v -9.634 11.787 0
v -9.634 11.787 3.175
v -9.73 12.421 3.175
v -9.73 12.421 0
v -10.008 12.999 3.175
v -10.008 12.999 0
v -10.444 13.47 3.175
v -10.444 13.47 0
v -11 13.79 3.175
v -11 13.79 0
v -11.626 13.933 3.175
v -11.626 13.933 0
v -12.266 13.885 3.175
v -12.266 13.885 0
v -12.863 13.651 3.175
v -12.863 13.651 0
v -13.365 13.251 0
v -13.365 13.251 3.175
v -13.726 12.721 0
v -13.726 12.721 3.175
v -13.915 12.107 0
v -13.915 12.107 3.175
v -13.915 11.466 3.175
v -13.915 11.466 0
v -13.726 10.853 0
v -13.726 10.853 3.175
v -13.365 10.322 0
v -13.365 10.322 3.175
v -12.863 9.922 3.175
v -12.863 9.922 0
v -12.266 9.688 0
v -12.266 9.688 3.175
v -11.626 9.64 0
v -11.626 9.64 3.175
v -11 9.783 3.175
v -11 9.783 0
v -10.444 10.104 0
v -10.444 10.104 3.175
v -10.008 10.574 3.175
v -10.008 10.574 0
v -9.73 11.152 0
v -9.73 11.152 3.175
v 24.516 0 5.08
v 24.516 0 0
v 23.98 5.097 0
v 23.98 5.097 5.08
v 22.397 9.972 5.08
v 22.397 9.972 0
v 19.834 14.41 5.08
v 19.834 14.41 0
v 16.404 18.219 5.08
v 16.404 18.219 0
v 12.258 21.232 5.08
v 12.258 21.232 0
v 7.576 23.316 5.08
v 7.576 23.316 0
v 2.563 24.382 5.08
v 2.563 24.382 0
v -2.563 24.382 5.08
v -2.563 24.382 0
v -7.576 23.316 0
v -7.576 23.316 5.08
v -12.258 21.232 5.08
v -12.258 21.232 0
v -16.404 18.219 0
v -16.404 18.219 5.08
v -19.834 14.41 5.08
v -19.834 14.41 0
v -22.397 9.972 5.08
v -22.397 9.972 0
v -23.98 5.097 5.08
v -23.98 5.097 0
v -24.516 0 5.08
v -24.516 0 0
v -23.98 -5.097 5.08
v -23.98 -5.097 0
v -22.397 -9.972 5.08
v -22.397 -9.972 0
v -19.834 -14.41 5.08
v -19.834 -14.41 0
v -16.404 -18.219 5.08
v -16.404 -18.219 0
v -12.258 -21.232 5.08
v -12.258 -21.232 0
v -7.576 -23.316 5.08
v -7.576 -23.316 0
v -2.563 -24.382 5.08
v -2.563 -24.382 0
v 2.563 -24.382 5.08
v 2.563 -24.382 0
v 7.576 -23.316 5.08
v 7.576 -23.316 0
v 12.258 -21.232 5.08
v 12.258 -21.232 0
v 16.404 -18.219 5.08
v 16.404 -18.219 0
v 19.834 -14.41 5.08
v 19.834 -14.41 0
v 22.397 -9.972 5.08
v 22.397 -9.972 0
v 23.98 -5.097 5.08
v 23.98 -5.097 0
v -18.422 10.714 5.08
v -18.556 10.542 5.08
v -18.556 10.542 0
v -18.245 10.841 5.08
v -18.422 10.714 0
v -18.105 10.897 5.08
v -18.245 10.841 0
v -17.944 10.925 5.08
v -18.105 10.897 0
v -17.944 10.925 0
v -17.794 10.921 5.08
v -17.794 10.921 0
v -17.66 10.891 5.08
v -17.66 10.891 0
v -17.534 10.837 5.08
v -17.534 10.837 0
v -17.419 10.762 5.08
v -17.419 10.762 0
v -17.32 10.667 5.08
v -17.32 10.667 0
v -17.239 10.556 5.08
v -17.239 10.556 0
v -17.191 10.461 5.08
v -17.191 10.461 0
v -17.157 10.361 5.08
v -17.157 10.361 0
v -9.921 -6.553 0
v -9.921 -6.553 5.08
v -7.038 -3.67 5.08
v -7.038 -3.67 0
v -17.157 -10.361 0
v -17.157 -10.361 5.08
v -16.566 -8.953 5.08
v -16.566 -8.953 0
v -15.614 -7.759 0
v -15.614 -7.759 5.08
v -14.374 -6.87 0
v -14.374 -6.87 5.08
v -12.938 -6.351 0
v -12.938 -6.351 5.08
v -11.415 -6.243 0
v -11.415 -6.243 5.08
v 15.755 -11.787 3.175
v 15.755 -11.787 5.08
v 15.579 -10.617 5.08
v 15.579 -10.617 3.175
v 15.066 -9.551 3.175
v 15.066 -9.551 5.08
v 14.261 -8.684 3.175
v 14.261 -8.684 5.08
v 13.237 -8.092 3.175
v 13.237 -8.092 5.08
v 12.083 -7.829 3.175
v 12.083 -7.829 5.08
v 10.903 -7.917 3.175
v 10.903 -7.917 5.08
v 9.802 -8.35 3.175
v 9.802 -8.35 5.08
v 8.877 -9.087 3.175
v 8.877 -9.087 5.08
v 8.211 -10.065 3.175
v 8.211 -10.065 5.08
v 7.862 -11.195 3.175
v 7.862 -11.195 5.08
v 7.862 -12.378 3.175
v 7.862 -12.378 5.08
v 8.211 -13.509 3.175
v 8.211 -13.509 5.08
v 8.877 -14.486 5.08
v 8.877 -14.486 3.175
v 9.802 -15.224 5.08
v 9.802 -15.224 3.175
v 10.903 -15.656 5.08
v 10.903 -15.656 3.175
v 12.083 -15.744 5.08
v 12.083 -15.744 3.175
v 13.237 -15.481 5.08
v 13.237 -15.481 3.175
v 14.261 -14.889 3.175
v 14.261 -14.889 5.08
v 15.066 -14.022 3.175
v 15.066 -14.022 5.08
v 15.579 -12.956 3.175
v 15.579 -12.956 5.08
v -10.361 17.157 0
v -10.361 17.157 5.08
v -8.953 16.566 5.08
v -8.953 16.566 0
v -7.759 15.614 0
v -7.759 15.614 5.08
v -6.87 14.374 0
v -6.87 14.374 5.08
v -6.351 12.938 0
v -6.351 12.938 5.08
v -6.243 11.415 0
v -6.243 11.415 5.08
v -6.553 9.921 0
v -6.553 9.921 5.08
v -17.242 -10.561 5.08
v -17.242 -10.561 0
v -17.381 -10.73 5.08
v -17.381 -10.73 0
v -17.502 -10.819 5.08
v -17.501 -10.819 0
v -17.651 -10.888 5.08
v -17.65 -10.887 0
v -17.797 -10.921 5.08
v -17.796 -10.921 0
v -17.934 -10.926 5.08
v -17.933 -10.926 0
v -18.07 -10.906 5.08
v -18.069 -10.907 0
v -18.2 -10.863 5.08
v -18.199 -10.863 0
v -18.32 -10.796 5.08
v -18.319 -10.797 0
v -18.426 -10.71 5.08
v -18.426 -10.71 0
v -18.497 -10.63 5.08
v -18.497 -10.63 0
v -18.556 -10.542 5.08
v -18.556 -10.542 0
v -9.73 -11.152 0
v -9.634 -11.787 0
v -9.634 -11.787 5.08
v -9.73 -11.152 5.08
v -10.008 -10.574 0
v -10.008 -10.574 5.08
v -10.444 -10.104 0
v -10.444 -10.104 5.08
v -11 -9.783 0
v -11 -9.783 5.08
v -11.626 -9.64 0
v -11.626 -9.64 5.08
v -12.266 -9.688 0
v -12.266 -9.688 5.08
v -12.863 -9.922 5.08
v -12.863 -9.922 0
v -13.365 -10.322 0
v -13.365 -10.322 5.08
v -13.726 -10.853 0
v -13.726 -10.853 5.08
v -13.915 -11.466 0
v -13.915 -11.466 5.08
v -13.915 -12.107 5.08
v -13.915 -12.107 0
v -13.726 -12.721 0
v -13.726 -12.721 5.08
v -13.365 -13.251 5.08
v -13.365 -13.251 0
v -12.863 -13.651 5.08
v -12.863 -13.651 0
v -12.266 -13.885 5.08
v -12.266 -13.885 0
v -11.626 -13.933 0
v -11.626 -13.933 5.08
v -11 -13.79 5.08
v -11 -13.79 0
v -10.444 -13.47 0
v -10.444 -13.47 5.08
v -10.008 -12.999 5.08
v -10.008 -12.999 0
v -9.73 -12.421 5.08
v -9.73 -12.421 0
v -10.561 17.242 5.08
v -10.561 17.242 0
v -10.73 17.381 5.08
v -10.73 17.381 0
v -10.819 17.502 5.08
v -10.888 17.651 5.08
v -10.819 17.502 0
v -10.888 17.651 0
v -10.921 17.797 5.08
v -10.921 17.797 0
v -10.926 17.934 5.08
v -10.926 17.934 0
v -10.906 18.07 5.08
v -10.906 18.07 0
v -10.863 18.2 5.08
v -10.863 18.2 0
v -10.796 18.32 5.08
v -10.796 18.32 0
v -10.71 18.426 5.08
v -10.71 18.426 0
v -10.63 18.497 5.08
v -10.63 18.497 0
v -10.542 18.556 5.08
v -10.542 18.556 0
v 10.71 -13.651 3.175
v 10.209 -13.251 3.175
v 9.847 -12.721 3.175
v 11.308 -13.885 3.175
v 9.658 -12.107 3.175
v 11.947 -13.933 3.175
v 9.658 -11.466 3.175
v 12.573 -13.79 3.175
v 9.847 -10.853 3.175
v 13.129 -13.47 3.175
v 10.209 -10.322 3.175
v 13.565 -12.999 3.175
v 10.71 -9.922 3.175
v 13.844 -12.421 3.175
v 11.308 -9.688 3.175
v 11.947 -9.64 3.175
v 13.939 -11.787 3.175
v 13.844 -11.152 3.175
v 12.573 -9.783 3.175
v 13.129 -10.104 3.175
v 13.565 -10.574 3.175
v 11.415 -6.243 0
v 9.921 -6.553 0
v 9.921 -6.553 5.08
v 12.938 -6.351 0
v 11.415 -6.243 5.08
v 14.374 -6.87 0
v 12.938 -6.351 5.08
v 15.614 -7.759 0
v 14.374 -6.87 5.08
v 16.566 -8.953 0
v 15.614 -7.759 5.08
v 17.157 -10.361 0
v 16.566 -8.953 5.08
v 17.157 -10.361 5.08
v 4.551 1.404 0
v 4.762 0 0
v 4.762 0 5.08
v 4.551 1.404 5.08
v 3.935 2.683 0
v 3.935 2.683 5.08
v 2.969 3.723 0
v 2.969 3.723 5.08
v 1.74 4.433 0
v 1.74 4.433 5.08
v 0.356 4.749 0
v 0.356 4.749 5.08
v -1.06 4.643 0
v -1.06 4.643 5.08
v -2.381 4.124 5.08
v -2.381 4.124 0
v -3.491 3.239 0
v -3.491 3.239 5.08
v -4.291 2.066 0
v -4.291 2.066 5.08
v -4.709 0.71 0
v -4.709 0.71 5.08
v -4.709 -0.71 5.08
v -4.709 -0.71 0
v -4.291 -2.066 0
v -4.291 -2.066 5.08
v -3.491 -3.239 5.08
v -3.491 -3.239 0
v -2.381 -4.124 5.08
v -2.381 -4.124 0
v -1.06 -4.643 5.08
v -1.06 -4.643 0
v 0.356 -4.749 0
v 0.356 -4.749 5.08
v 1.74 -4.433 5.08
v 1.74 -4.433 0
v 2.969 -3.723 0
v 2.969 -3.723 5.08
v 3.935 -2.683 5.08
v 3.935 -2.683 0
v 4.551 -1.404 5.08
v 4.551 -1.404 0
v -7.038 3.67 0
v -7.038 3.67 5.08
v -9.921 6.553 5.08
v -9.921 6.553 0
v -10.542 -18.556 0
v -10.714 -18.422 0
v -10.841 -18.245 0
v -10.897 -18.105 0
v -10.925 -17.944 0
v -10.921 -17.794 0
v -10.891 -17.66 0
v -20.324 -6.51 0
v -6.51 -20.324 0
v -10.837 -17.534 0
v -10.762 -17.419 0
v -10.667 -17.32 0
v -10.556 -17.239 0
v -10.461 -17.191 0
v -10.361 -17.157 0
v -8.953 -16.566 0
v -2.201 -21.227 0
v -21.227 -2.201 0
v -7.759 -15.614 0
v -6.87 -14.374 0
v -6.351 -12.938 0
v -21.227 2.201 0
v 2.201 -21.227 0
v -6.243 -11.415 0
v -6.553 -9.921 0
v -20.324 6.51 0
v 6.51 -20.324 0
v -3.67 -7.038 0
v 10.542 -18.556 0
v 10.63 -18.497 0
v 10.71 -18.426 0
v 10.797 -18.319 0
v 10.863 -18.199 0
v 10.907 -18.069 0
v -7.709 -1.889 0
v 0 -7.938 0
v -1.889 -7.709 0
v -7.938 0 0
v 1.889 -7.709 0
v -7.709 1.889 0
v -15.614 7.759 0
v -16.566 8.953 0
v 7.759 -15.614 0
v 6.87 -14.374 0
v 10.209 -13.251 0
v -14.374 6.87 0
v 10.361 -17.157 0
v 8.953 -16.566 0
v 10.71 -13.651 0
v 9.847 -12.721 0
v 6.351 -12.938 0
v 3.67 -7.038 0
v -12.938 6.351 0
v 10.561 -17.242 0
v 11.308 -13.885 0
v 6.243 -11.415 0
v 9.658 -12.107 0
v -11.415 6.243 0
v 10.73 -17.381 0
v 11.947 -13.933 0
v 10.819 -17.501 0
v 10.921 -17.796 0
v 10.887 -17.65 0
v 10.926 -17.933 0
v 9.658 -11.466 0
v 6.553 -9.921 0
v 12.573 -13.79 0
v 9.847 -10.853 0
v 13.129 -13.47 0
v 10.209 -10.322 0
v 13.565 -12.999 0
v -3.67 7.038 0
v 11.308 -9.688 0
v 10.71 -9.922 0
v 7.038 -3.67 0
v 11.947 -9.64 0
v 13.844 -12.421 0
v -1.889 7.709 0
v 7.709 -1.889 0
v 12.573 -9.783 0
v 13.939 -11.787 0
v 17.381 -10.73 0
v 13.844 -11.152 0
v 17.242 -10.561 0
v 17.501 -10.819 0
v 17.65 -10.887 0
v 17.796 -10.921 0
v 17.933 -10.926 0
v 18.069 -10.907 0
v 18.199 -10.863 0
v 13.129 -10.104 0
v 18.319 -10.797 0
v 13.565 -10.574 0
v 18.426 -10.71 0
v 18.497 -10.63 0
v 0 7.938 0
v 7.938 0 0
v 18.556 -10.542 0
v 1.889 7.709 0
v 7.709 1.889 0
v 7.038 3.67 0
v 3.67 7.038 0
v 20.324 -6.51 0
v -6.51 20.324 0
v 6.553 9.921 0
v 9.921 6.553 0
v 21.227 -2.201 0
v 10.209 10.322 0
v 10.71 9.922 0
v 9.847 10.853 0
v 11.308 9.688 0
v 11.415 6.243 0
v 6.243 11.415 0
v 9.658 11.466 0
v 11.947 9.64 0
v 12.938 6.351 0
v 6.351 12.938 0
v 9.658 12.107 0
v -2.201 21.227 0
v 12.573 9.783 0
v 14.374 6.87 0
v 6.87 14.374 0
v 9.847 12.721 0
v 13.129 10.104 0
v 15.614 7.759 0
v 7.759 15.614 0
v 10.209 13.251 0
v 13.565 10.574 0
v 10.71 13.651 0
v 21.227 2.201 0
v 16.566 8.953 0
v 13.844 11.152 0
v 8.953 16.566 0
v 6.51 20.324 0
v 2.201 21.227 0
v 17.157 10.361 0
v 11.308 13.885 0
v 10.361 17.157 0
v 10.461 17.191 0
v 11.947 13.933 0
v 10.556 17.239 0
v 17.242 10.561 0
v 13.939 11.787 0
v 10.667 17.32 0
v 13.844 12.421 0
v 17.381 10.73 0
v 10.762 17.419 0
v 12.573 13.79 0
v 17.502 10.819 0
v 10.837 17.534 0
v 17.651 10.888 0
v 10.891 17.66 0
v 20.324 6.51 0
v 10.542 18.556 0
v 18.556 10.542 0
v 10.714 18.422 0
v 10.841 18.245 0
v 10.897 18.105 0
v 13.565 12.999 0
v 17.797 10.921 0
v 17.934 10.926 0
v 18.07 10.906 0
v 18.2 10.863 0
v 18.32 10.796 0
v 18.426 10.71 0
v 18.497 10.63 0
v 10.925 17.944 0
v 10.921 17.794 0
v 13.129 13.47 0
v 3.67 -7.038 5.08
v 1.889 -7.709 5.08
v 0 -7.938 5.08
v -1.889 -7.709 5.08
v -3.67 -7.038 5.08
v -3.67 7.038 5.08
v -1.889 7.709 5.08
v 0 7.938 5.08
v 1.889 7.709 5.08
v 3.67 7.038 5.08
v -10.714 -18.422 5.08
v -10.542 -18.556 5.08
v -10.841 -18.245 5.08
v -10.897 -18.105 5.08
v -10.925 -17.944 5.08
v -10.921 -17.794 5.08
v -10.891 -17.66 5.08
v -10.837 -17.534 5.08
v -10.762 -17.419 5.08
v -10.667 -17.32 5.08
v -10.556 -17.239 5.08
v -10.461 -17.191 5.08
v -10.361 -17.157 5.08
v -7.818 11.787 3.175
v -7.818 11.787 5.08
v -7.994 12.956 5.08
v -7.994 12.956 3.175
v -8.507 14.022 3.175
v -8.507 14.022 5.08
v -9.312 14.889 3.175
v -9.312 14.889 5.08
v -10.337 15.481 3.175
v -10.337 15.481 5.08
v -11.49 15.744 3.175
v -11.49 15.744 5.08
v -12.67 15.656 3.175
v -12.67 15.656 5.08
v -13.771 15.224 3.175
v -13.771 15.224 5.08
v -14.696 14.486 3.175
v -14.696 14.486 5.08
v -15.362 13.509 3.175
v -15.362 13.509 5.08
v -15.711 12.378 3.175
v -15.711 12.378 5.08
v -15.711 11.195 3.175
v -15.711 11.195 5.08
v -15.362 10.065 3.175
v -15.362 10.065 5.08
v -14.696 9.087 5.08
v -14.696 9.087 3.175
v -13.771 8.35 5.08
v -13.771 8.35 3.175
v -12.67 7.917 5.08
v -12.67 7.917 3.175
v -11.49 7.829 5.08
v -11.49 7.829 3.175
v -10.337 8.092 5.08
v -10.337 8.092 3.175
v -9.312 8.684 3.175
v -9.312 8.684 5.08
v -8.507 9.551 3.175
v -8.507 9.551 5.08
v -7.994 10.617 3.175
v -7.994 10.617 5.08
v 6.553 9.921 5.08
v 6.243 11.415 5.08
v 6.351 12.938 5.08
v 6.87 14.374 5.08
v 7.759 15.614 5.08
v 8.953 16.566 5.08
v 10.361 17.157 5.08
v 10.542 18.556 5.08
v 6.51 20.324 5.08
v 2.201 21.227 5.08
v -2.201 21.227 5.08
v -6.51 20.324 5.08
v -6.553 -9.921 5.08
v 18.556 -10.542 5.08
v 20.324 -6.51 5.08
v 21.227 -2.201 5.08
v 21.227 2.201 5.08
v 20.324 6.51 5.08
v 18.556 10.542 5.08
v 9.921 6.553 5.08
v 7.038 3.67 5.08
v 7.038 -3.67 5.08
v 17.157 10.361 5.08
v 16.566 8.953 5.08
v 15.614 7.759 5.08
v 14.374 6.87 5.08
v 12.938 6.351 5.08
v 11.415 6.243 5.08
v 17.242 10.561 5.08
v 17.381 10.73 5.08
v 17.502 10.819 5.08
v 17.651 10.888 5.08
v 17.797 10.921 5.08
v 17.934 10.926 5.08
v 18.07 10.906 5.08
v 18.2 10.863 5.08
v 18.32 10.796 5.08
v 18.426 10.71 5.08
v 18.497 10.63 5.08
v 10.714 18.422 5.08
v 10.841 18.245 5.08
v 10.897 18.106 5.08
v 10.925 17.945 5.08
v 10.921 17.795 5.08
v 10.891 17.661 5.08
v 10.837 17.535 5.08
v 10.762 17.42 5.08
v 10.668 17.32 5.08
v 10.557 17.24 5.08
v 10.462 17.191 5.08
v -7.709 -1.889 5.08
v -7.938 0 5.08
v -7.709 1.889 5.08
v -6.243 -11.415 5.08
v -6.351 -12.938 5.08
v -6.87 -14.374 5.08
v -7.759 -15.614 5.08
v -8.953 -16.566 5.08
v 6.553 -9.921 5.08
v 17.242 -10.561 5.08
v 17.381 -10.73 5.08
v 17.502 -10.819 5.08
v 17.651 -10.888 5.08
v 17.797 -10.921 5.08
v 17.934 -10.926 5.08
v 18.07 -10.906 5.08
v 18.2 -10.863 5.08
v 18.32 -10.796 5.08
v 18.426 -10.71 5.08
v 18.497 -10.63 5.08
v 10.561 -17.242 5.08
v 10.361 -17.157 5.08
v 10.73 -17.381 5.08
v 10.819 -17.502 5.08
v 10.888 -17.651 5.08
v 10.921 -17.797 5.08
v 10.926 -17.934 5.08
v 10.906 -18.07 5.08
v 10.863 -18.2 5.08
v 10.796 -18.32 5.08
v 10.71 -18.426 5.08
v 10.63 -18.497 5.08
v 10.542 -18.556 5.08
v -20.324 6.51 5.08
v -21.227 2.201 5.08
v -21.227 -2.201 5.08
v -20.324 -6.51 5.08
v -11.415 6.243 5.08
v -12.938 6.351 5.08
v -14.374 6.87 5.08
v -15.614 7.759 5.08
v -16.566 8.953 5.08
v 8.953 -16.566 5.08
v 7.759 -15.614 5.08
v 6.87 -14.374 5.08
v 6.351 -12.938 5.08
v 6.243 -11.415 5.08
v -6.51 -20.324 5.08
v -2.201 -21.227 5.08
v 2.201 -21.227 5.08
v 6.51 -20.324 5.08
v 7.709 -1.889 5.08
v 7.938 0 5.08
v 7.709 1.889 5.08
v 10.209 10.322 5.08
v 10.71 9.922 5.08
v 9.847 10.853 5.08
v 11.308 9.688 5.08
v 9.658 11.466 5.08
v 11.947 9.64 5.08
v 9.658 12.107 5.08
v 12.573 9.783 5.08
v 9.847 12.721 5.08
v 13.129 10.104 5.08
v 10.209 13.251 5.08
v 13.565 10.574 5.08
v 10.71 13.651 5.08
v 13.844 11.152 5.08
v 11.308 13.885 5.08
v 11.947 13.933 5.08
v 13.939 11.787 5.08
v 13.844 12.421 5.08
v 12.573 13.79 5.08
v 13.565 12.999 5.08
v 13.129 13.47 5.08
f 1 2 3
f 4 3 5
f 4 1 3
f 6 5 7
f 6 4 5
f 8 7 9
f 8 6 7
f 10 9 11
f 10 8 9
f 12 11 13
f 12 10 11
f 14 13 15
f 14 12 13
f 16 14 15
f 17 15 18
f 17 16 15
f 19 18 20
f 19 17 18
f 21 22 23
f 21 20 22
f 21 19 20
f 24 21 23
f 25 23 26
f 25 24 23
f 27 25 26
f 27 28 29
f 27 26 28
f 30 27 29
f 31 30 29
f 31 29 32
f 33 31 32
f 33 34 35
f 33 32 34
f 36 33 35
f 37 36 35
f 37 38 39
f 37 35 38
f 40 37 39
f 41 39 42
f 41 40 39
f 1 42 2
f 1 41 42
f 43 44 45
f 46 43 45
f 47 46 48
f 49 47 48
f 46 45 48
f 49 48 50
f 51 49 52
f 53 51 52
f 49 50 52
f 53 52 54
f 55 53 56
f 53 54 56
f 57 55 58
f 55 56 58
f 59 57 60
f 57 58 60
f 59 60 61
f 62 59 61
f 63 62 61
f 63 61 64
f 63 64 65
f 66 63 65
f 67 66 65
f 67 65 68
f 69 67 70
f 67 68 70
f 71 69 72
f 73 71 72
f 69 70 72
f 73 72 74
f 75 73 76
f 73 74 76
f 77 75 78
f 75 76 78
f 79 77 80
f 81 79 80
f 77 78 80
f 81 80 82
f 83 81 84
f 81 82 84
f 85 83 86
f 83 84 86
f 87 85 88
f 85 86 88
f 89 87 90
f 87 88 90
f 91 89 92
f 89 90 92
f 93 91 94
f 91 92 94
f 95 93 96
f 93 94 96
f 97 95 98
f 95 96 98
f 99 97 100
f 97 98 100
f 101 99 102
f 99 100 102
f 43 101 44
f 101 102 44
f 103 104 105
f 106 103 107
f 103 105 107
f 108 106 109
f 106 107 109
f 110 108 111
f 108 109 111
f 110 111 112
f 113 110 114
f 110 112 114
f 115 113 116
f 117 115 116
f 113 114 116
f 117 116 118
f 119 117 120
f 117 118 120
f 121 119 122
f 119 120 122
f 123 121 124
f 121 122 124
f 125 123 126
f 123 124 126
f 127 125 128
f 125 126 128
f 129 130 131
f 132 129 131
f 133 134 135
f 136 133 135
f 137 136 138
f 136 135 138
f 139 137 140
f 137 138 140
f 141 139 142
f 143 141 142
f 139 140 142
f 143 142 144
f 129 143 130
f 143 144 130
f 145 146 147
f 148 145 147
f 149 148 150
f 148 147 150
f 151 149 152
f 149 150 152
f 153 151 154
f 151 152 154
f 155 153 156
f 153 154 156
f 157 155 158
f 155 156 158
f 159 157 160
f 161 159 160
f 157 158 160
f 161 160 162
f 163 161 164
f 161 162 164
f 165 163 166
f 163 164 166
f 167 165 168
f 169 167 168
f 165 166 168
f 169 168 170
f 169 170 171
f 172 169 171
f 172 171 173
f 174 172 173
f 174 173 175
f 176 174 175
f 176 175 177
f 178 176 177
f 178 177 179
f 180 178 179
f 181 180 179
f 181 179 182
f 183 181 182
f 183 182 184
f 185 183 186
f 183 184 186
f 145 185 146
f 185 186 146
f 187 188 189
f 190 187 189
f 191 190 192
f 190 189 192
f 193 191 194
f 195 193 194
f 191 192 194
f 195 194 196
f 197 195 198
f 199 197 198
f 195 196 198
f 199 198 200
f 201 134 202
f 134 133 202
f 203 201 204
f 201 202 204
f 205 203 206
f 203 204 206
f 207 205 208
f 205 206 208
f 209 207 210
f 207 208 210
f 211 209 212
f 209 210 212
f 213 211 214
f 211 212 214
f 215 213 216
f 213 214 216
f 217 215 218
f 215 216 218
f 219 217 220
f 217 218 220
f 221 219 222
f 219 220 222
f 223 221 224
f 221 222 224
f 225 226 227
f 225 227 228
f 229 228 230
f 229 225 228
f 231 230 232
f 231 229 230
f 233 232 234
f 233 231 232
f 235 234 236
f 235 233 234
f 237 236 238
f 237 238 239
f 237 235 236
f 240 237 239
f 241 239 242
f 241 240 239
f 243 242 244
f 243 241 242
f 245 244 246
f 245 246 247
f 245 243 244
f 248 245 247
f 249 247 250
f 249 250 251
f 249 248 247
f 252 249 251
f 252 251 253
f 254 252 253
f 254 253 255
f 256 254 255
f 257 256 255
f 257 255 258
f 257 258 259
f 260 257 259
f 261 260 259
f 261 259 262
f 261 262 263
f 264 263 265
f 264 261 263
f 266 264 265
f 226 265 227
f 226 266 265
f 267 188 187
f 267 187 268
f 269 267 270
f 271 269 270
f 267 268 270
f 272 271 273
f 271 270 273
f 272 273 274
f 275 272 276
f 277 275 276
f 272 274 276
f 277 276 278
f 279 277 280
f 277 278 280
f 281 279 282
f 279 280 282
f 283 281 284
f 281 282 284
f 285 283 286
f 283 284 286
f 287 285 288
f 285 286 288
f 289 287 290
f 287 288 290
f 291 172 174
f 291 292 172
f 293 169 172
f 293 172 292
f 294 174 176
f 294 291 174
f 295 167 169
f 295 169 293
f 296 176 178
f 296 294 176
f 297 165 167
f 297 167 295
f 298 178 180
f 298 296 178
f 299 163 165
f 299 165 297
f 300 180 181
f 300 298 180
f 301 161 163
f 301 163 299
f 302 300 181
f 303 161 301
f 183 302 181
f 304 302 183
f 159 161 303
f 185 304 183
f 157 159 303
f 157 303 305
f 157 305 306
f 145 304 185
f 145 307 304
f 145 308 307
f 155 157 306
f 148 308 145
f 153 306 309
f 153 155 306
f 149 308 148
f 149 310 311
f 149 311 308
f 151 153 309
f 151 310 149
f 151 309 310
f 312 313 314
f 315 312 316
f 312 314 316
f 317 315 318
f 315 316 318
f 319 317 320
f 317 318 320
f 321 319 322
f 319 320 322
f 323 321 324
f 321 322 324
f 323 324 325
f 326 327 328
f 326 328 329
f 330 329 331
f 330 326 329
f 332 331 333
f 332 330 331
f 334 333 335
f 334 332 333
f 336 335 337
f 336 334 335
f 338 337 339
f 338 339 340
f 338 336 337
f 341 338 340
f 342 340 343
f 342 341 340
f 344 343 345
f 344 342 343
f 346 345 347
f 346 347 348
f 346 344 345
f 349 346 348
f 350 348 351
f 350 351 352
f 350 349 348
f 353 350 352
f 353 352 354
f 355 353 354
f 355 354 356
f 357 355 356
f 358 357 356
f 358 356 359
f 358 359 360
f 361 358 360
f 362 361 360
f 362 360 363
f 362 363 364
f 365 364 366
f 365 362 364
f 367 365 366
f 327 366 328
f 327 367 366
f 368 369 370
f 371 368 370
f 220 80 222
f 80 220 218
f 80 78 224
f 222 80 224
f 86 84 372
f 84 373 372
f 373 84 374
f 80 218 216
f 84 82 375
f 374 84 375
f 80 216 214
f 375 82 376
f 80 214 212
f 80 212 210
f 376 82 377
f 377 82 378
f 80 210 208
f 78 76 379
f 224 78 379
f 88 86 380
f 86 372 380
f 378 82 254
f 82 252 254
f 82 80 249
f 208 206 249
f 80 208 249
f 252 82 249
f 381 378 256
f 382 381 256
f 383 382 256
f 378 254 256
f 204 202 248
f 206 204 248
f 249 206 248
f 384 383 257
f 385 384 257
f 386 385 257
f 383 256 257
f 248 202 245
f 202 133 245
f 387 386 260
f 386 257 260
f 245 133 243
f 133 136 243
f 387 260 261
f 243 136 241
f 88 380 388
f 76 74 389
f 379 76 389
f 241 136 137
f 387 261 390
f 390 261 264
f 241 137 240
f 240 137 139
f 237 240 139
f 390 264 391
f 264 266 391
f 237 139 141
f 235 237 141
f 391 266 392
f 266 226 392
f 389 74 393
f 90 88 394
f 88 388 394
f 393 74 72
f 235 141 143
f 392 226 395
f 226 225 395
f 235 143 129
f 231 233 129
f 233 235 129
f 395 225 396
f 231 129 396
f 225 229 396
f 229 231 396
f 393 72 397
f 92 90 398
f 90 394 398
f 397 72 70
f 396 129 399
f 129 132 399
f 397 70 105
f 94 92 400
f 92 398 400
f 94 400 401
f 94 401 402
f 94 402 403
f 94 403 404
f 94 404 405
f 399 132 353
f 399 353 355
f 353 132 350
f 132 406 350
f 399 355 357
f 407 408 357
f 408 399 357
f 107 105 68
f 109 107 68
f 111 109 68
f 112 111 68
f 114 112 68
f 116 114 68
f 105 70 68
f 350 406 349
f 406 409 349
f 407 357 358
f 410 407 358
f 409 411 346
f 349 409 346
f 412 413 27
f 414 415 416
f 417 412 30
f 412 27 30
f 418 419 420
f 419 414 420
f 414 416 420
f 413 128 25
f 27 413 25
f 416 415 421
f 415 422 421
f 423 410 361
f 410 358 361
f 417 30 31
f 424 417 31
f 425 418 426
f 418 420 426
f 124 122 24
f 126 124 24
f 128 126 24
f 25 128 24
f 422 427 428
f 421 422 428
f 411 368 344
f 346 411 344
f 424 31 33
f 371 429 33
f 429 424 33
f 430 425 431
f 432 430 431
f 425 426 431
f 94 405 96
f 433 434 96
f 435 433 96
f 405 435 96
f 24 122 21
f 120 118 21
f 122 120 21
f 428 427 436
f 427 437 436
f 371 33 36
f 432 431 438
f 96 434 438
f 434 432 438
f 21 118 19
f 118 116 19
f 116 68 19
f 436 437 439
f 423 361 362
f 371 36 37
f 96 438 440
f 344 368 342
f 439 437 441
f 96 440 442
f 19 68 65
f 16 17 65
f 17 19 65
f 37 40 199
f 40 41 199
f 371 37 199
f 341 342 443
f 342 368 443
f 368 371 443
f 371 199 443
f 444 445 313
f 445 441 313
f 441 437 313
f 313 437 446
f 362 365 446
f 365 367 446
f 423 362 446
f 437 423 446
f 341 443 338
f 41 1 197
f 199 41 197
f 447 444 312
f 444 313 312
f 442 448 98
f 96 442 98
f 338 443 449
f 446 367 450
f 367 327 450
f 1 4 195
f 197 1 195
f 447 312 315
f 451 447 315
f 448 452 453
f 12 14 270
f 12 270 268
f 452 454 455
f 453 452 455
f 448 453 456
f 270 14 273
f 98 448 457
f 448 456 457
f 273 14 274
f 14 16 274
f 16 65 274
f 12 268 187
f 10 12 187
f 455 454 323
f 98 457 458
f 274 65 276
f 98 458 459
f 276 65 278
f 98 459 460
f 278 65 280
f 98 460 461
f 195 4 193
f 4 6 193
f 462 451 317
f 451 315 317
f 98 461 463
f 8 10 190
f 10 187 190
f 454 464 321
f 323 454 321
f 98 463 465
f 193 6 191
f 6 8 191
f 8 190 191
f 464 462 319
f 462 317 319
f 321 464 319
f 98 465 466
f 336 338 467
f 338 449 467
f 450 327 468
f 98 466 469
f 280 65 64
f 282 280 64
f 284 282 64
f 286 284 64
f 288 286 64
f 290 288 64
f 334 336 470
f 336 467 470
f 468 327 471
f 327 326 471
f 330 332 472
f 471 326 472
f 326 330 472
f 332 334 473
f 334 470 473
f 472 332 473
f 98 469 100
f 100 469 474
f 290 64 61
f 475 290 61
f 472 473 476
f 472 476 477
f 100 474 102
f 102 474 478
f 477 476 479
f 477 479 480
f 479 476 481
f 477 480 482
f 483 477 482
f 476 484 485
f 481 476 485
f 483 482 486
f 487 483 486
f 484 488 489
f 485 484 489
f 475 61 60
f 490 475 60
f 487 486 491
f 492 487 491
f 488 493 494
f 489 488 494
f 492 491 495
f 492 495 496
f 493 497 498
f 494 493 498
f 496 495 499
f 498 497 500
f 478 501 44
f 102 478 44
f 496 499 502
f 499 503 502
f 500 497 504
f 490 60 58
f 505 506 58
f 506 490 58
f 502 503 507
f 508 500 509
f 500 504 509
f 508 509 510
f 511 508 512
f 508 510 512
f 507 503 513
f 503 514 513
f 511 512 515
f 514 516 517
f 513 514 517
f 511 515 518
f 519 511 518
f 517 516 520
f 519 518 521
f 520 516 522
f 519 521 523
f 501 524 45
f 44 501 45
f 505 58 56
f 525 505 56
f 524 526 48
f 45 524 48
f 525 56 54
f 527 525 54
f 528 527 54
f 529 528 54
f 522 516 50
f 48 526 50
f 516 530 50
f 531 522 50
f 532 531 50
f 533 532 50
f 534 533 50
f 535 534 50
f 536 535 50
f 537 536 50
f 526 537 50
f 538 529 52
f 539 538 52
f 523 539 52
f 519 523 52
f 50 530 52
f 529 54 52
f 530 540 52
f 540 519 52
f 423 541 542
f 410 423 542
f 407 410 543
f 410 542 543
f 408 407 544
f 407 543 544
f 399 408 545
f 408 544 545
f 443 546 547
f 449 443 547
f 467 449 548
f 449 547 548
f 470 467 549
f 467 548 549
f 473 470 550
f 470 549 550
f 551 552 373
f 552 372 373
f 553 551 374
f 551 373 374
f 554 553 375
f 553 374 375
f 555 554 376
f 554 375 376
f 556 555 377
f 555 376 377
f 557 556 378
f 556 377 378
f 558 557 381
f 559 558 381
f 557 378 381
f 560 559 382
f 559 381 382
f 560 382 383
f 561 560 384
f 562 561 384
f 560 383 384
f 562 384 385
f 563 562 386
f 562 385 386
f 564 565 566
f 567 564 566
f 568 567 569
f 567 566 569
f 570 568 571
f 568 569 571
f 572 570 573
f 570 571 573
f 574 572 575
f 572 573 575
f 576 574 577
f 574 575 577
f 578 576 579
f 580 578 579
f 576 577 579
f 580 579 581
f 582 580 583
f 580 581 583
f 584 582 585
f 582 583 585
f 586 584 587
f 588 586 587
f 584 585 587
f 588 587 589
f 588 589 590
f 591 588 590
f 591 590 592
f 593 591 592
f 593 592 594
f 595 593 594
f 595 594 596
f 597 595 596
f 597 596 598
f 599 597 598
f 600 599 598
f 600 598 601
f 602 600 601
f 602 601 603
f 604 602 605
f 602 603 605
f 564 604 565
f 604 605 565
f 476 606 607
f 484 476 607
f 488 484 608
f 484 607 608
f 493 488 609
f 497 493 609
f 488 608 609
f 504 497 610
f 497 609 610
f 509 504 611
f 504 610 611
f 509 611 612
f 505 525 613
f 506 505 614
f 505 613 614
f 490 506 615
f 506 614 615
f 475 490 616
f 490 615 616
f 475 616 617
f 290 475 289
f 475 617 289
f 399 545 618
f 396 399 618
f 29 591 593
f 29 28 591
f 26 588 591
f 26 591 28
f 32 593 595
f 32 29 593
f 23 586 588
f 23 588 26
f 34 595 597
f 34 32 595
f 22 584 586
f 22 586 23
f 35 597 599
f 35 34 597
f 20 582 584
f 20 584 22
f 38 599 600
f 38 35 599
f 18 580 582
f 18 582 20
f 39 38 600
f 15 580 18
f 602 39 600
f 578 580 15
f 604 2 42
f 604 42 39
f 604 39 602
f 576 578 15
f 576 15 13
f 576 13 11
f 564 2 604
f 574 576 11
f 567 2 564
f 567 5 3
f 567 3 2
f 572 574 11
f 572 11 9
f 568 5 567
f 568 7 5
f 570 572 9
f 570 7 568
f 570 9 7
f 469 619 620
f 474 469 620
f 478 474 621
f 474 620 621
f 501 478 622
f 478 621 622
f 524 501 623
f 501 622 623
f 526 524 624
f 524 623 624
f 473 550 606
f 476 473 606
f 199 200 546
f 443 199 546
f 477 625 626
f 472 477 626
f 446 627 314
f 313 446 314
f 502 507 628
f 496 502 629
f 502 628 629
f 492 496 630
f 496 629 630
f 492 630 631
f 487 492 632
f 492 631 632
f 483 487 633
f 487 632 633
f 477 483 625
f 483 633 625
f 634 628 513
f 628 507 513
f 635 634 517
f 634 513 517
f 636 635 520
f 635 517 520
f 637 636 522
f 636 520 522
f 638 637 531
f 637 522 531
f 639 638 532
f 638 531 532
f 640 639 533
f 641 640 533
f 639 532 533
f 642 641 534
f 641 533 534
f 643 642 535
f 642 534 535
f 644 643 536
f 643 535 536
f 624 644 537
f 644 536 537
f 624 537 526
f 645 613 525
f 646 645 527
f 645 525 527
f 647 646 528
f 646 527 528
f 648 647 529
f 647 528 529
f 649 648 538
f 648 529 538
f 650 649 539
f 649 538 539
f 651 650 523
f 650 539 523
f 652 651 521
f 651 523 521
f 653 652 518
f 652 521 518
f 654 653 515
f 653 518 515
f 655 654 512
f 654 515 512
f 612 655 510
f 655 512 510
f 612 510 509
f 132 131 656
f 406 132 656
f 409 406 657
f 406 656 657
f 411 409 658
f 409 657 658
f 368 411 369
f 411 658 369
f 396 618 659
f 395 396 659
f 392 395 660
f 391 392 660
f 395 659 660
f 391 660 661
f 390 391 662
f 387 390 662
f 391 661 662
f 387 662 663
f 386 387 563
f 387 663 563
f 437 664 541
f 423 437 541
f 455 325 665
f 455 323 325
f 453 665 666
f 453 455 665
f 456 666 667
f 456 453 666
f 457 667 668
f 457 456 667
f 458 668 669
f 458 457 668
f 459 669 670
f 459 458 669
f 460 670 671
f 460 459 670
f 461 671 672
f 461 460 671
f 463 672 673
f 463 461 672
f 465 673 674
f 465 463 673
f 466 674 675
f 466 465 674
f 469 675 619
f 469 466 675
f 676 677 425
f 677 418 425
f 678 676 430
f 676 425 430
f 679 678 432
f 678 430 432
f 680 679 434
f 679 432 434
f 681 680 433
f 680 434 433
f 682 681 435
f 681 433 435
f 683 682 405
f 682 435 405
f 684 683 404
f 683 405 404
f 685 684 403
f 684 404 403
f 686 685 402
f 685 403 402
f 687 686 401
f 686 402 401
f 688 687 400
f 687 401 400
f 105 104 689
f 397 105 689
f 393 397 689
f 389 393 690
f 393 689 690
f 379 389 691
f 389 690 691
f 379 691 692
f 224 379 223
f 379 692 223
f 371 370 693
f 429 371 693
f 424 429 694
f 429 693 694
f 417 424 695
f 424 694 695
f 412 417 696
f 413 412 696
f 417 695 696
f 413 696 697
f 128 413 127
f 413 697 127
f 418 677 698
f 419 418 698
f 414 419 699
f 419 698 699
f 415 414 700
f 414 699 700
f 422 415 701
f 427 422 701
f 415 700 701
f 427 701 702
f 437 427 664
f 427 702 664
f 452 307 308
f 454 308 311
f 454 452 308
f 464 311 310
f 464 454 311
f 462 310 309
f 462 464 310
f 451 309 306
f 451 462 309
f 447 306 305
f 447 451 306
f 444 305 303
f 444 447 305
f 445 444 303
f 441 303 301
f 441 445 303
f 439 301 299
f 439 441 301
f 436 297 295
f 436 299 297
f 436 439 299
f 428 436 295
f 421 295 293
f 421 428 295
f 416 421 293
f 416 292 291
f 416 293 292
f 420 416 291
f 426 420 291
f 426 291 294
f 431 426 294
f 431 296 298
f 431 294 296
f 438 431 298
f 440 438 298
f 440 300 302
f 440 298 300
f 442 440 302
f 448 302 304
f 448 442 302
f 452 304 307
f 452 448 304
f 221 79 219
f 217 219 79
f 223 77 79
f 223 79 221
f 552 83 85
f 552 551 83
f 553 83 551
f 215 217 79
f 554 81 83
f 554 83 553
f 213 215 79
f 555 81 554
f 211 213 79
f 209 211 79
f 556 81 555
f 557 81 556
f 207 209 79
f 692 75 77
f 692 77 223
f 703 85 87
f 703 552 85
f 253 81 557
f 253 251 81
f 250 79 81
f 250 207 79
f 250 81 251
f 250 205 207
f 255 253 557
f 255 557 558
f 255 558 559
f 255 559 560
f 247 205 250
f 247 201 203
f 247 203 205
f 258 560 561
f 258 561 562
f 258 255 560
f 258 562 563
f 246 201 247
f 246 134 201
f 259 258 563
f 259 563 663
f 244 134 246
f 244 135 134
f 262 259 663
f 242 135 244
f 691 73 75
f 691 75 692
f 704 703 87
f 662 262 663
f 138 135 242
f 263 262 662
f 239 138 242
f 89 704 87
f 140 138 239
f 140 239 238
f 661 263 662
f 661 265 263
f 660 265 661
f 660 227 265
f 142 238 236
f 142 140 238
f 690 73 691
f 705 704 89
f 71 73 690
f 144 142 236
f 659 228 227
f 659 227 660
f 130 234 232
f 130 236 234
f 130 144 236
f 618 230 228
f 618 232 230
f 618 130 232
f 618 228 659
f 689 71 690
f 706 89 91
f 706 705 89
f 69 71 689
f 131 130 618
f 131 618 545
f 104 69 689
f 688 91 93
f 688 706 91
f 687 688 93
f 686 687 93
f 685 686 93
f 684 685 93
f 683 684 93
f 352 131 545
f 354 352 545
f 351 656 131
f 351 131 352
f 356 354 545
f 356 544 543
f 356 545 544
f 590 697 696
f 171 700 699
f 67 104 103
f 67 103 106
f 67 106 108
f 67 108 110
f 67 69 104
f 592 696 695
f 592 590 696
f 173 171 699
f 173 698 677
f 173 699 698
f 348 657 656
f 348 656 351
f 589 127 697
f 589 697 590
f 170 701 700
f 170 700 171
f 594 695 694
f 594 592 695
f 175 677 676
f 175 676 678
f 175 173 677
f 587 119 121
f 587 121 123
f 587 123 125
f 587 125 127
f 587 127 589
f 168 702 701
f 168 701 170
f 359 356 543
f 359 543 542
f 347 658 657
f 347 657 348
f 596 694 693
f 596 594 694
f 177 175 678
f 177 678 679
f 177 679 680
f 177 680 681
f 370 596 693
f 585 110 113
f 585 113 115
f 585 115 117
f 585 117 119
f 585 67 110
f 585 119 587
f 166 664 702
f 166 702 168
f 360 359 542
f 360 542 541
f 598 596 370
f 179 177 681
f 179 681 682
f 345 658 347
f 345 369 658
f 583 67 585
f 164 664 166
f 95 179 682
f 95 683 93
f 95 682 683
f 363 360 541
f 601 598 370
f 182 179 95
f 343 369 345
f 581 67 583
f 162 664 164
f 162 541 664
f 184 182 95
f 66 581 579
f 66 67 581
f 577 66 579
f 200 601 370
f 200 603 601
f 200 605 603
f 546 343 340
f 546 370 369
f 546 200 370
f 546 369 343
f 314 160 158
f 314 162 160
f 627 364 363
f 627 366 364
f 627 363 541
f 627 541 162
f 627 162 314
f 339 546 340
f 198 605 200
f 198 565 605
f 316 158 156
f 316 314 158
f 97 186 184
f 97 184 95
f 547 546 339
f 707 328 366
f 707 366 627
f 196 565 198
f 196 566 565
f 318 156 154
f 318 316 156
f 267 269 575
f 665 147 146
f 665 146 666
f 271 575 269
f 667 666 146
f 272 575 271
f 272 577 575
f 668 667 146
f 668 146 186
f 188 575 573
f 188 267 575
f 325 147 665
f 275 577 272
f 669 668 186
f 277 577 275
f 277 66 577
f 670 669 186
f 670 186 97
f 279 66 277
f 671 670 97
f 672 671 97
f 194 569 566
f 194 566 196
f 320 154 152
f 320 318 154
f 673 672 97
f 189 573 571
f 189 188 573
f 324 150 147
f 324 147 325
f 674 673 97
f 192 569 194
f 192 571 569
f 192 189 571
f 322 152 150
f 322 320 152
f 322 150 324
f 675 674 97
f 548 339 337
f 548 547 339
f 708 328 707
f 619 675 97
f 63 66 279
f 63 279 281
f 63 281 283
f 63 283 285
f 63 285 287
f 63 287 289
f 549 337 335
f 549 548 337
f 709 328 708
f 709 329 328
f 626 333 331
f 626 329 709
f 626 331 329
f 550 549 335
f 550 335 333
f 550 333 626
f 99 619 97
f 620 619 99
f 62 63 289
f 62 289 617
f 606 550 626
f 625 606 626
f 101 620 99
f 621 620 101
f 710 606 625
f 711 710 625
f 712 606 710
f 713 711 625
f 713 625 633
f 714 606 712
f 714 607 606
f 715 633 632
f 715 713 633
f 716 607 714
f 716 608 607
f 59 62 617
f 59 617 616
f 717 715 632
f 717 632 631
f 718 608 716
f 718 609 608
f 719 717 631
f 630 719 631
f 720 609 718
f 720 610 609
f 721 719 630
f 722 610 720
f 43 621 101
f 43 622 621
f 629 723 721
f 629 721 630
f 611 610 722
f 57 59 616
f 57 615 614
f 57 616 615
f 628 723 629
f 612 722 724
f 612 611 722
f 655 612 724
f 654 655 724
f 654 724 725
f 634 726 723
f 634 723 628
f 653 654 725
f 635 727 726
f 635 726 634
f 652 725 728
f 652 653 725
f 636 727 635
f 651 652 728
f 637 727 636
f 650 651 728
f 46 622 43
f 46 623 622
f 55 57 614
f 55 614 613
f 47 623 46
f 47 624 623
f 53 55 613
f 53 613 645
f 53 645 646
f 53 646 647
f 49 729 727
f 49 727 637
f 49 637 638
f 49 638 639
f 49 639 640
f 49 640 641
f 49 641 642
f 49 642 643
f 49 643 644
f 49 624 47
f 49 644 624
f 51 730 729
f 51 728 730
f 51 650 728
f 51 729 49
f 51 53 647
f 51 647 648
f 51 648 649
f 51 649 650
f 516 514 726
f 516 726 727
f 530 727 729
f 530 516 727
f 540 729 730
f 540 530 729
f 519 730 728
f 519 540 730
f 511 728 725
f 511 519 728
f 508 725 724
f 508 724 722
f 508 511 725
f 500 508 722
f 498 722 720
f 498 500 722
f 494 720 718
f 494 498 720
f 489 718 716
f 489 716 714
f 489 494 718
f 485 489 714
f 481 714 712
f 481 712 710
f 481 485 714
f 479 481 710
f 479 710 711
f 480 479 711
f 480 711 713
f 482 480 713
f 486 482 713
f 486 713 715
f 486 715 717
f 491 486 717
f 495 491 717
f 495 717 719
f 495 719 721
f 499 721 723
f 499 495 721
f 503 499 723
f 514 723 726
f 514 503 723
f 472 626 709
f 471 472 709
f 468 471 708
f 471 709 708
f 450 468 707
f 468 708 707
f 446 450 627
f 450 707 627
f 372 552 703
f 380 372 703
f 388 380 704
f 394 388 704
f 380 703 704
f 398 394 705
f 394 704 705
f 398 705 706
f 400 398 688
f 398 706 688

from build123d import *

# Parameters (mm, degrees)
F0_R            = 24.51608
F0_R_2          = 2.15265
F0_R_3          = 4.7625
F1_DEPTH        = 5.08
F3_DEPTH        = 5.08
F3_COPIES_COUNT = 4
F4_R            = 0.762
F6_R            = 3.96875
F7_DEPTH        = 1.905


# Not quite as in the source:
# - a pattern or mirror of a feature is missing from the dataset's text; its kind, count and spacing are read off the source's solid


with BuildPart() as f1:
    # F0 (on Top) → F1 (new body)
    with BuildSketch(Plane.XY):
        Circle(F0_R)
        with Locations((-11.7865906, -11.7865906)):
            Circle(F0_R_2, mode=Mode.SUBTRACT)
        with Locations((11.7865906, -11.7865906)):
            Circle(F0_R_2, mode=Mode.SUBTRACT)
        with Locations((-11.7865906, 11.7865906)):
            Circle(F0_R_2, mode=Mode.SUBTRACT)
        Circle(F0_R_3, mode=Mode.SUBTRACT)
        with Locations((11.7865906, 11.7865906)):
            Circle(F0_R_2, mode=Mode.SUBTRACT)
    extrude(amount=F1_DEPTH)

    # F2 (on face) → F3 (cut, through all)
    with BuildSketch(Plane.XY.offset(5.08)):
        with BuildLine():
            ThreePointArc((-12.5005198818, 17.2967828873), (-7.4612395718, 15.2741760893), (-6.553034663, 9.9206307084))
            Line((-6.553034663, 9.9206307084), (-3.6703384477, 7.0379344931))
            ThreePointArc((-3.6703384477, 7.0379344931), (0, 7.9375), (3.6703384477, 7.0379344931))
            Line((3.6703384477, 7.0379344931), (6.553034663, 9.9206307084))
            ThreePointArc((6.553034663, 9.9206307084), (7.4612395718, 15.2741760893), (12.5005198818, 17.2967828873))
            ThreePointArc((12.5005198818, 17.2967828873), (0, 21.34108), (-12.5005198818, 17.2967828873))
        make_face()
    f3 = extrude(amount=-F3_DEPTH, mode=Mode.SUBTRACT)

    # F3_copies: F3 ×4 about axis
    f3_copies_axis = Axis((0, 0, 0), (0, 0, 1))
    for i in range(1, F3_COPIES_COUNT):
        add(f3.rotate(f3_copies_axis, i * 360 / F3_COPIES_COUNT), mode=Mode.SUBTRACT)

    # F4
    f4_edges = [f1.edges().sort_by_distance(p)[0] for p in [
        (-12.50052, 17.296783, 2.54),
        (12.50052, 17.296783, 2.54),
        (-17.296783, -12.50052, 2.54),
        (-17.296783, 12.50052, 2.54),
        (12.50052, -17.296783, 2.54),
        (-12.50052, -17.296783, 2.54),
        (17.296783, 12.50052, 2.54),
        (17.296783, -12.50052, 2.54),
    ]]
    fillet(f4_edges, radius=F4_R)

    # F6 (on face) → F7 (cut, through all)
    with BuildSketch(Plane.XY.offset(5.08)):
        with Locations((11.7865906, -11.7865906)):
            Circle(F6_R)
        with Locations((-11.7865906, 11.7865906)):
            Circle(F6_R)
    extrude(amount=-F7_DEPTH, mode=Mode.SUBTRACT)


solid = f1.part
